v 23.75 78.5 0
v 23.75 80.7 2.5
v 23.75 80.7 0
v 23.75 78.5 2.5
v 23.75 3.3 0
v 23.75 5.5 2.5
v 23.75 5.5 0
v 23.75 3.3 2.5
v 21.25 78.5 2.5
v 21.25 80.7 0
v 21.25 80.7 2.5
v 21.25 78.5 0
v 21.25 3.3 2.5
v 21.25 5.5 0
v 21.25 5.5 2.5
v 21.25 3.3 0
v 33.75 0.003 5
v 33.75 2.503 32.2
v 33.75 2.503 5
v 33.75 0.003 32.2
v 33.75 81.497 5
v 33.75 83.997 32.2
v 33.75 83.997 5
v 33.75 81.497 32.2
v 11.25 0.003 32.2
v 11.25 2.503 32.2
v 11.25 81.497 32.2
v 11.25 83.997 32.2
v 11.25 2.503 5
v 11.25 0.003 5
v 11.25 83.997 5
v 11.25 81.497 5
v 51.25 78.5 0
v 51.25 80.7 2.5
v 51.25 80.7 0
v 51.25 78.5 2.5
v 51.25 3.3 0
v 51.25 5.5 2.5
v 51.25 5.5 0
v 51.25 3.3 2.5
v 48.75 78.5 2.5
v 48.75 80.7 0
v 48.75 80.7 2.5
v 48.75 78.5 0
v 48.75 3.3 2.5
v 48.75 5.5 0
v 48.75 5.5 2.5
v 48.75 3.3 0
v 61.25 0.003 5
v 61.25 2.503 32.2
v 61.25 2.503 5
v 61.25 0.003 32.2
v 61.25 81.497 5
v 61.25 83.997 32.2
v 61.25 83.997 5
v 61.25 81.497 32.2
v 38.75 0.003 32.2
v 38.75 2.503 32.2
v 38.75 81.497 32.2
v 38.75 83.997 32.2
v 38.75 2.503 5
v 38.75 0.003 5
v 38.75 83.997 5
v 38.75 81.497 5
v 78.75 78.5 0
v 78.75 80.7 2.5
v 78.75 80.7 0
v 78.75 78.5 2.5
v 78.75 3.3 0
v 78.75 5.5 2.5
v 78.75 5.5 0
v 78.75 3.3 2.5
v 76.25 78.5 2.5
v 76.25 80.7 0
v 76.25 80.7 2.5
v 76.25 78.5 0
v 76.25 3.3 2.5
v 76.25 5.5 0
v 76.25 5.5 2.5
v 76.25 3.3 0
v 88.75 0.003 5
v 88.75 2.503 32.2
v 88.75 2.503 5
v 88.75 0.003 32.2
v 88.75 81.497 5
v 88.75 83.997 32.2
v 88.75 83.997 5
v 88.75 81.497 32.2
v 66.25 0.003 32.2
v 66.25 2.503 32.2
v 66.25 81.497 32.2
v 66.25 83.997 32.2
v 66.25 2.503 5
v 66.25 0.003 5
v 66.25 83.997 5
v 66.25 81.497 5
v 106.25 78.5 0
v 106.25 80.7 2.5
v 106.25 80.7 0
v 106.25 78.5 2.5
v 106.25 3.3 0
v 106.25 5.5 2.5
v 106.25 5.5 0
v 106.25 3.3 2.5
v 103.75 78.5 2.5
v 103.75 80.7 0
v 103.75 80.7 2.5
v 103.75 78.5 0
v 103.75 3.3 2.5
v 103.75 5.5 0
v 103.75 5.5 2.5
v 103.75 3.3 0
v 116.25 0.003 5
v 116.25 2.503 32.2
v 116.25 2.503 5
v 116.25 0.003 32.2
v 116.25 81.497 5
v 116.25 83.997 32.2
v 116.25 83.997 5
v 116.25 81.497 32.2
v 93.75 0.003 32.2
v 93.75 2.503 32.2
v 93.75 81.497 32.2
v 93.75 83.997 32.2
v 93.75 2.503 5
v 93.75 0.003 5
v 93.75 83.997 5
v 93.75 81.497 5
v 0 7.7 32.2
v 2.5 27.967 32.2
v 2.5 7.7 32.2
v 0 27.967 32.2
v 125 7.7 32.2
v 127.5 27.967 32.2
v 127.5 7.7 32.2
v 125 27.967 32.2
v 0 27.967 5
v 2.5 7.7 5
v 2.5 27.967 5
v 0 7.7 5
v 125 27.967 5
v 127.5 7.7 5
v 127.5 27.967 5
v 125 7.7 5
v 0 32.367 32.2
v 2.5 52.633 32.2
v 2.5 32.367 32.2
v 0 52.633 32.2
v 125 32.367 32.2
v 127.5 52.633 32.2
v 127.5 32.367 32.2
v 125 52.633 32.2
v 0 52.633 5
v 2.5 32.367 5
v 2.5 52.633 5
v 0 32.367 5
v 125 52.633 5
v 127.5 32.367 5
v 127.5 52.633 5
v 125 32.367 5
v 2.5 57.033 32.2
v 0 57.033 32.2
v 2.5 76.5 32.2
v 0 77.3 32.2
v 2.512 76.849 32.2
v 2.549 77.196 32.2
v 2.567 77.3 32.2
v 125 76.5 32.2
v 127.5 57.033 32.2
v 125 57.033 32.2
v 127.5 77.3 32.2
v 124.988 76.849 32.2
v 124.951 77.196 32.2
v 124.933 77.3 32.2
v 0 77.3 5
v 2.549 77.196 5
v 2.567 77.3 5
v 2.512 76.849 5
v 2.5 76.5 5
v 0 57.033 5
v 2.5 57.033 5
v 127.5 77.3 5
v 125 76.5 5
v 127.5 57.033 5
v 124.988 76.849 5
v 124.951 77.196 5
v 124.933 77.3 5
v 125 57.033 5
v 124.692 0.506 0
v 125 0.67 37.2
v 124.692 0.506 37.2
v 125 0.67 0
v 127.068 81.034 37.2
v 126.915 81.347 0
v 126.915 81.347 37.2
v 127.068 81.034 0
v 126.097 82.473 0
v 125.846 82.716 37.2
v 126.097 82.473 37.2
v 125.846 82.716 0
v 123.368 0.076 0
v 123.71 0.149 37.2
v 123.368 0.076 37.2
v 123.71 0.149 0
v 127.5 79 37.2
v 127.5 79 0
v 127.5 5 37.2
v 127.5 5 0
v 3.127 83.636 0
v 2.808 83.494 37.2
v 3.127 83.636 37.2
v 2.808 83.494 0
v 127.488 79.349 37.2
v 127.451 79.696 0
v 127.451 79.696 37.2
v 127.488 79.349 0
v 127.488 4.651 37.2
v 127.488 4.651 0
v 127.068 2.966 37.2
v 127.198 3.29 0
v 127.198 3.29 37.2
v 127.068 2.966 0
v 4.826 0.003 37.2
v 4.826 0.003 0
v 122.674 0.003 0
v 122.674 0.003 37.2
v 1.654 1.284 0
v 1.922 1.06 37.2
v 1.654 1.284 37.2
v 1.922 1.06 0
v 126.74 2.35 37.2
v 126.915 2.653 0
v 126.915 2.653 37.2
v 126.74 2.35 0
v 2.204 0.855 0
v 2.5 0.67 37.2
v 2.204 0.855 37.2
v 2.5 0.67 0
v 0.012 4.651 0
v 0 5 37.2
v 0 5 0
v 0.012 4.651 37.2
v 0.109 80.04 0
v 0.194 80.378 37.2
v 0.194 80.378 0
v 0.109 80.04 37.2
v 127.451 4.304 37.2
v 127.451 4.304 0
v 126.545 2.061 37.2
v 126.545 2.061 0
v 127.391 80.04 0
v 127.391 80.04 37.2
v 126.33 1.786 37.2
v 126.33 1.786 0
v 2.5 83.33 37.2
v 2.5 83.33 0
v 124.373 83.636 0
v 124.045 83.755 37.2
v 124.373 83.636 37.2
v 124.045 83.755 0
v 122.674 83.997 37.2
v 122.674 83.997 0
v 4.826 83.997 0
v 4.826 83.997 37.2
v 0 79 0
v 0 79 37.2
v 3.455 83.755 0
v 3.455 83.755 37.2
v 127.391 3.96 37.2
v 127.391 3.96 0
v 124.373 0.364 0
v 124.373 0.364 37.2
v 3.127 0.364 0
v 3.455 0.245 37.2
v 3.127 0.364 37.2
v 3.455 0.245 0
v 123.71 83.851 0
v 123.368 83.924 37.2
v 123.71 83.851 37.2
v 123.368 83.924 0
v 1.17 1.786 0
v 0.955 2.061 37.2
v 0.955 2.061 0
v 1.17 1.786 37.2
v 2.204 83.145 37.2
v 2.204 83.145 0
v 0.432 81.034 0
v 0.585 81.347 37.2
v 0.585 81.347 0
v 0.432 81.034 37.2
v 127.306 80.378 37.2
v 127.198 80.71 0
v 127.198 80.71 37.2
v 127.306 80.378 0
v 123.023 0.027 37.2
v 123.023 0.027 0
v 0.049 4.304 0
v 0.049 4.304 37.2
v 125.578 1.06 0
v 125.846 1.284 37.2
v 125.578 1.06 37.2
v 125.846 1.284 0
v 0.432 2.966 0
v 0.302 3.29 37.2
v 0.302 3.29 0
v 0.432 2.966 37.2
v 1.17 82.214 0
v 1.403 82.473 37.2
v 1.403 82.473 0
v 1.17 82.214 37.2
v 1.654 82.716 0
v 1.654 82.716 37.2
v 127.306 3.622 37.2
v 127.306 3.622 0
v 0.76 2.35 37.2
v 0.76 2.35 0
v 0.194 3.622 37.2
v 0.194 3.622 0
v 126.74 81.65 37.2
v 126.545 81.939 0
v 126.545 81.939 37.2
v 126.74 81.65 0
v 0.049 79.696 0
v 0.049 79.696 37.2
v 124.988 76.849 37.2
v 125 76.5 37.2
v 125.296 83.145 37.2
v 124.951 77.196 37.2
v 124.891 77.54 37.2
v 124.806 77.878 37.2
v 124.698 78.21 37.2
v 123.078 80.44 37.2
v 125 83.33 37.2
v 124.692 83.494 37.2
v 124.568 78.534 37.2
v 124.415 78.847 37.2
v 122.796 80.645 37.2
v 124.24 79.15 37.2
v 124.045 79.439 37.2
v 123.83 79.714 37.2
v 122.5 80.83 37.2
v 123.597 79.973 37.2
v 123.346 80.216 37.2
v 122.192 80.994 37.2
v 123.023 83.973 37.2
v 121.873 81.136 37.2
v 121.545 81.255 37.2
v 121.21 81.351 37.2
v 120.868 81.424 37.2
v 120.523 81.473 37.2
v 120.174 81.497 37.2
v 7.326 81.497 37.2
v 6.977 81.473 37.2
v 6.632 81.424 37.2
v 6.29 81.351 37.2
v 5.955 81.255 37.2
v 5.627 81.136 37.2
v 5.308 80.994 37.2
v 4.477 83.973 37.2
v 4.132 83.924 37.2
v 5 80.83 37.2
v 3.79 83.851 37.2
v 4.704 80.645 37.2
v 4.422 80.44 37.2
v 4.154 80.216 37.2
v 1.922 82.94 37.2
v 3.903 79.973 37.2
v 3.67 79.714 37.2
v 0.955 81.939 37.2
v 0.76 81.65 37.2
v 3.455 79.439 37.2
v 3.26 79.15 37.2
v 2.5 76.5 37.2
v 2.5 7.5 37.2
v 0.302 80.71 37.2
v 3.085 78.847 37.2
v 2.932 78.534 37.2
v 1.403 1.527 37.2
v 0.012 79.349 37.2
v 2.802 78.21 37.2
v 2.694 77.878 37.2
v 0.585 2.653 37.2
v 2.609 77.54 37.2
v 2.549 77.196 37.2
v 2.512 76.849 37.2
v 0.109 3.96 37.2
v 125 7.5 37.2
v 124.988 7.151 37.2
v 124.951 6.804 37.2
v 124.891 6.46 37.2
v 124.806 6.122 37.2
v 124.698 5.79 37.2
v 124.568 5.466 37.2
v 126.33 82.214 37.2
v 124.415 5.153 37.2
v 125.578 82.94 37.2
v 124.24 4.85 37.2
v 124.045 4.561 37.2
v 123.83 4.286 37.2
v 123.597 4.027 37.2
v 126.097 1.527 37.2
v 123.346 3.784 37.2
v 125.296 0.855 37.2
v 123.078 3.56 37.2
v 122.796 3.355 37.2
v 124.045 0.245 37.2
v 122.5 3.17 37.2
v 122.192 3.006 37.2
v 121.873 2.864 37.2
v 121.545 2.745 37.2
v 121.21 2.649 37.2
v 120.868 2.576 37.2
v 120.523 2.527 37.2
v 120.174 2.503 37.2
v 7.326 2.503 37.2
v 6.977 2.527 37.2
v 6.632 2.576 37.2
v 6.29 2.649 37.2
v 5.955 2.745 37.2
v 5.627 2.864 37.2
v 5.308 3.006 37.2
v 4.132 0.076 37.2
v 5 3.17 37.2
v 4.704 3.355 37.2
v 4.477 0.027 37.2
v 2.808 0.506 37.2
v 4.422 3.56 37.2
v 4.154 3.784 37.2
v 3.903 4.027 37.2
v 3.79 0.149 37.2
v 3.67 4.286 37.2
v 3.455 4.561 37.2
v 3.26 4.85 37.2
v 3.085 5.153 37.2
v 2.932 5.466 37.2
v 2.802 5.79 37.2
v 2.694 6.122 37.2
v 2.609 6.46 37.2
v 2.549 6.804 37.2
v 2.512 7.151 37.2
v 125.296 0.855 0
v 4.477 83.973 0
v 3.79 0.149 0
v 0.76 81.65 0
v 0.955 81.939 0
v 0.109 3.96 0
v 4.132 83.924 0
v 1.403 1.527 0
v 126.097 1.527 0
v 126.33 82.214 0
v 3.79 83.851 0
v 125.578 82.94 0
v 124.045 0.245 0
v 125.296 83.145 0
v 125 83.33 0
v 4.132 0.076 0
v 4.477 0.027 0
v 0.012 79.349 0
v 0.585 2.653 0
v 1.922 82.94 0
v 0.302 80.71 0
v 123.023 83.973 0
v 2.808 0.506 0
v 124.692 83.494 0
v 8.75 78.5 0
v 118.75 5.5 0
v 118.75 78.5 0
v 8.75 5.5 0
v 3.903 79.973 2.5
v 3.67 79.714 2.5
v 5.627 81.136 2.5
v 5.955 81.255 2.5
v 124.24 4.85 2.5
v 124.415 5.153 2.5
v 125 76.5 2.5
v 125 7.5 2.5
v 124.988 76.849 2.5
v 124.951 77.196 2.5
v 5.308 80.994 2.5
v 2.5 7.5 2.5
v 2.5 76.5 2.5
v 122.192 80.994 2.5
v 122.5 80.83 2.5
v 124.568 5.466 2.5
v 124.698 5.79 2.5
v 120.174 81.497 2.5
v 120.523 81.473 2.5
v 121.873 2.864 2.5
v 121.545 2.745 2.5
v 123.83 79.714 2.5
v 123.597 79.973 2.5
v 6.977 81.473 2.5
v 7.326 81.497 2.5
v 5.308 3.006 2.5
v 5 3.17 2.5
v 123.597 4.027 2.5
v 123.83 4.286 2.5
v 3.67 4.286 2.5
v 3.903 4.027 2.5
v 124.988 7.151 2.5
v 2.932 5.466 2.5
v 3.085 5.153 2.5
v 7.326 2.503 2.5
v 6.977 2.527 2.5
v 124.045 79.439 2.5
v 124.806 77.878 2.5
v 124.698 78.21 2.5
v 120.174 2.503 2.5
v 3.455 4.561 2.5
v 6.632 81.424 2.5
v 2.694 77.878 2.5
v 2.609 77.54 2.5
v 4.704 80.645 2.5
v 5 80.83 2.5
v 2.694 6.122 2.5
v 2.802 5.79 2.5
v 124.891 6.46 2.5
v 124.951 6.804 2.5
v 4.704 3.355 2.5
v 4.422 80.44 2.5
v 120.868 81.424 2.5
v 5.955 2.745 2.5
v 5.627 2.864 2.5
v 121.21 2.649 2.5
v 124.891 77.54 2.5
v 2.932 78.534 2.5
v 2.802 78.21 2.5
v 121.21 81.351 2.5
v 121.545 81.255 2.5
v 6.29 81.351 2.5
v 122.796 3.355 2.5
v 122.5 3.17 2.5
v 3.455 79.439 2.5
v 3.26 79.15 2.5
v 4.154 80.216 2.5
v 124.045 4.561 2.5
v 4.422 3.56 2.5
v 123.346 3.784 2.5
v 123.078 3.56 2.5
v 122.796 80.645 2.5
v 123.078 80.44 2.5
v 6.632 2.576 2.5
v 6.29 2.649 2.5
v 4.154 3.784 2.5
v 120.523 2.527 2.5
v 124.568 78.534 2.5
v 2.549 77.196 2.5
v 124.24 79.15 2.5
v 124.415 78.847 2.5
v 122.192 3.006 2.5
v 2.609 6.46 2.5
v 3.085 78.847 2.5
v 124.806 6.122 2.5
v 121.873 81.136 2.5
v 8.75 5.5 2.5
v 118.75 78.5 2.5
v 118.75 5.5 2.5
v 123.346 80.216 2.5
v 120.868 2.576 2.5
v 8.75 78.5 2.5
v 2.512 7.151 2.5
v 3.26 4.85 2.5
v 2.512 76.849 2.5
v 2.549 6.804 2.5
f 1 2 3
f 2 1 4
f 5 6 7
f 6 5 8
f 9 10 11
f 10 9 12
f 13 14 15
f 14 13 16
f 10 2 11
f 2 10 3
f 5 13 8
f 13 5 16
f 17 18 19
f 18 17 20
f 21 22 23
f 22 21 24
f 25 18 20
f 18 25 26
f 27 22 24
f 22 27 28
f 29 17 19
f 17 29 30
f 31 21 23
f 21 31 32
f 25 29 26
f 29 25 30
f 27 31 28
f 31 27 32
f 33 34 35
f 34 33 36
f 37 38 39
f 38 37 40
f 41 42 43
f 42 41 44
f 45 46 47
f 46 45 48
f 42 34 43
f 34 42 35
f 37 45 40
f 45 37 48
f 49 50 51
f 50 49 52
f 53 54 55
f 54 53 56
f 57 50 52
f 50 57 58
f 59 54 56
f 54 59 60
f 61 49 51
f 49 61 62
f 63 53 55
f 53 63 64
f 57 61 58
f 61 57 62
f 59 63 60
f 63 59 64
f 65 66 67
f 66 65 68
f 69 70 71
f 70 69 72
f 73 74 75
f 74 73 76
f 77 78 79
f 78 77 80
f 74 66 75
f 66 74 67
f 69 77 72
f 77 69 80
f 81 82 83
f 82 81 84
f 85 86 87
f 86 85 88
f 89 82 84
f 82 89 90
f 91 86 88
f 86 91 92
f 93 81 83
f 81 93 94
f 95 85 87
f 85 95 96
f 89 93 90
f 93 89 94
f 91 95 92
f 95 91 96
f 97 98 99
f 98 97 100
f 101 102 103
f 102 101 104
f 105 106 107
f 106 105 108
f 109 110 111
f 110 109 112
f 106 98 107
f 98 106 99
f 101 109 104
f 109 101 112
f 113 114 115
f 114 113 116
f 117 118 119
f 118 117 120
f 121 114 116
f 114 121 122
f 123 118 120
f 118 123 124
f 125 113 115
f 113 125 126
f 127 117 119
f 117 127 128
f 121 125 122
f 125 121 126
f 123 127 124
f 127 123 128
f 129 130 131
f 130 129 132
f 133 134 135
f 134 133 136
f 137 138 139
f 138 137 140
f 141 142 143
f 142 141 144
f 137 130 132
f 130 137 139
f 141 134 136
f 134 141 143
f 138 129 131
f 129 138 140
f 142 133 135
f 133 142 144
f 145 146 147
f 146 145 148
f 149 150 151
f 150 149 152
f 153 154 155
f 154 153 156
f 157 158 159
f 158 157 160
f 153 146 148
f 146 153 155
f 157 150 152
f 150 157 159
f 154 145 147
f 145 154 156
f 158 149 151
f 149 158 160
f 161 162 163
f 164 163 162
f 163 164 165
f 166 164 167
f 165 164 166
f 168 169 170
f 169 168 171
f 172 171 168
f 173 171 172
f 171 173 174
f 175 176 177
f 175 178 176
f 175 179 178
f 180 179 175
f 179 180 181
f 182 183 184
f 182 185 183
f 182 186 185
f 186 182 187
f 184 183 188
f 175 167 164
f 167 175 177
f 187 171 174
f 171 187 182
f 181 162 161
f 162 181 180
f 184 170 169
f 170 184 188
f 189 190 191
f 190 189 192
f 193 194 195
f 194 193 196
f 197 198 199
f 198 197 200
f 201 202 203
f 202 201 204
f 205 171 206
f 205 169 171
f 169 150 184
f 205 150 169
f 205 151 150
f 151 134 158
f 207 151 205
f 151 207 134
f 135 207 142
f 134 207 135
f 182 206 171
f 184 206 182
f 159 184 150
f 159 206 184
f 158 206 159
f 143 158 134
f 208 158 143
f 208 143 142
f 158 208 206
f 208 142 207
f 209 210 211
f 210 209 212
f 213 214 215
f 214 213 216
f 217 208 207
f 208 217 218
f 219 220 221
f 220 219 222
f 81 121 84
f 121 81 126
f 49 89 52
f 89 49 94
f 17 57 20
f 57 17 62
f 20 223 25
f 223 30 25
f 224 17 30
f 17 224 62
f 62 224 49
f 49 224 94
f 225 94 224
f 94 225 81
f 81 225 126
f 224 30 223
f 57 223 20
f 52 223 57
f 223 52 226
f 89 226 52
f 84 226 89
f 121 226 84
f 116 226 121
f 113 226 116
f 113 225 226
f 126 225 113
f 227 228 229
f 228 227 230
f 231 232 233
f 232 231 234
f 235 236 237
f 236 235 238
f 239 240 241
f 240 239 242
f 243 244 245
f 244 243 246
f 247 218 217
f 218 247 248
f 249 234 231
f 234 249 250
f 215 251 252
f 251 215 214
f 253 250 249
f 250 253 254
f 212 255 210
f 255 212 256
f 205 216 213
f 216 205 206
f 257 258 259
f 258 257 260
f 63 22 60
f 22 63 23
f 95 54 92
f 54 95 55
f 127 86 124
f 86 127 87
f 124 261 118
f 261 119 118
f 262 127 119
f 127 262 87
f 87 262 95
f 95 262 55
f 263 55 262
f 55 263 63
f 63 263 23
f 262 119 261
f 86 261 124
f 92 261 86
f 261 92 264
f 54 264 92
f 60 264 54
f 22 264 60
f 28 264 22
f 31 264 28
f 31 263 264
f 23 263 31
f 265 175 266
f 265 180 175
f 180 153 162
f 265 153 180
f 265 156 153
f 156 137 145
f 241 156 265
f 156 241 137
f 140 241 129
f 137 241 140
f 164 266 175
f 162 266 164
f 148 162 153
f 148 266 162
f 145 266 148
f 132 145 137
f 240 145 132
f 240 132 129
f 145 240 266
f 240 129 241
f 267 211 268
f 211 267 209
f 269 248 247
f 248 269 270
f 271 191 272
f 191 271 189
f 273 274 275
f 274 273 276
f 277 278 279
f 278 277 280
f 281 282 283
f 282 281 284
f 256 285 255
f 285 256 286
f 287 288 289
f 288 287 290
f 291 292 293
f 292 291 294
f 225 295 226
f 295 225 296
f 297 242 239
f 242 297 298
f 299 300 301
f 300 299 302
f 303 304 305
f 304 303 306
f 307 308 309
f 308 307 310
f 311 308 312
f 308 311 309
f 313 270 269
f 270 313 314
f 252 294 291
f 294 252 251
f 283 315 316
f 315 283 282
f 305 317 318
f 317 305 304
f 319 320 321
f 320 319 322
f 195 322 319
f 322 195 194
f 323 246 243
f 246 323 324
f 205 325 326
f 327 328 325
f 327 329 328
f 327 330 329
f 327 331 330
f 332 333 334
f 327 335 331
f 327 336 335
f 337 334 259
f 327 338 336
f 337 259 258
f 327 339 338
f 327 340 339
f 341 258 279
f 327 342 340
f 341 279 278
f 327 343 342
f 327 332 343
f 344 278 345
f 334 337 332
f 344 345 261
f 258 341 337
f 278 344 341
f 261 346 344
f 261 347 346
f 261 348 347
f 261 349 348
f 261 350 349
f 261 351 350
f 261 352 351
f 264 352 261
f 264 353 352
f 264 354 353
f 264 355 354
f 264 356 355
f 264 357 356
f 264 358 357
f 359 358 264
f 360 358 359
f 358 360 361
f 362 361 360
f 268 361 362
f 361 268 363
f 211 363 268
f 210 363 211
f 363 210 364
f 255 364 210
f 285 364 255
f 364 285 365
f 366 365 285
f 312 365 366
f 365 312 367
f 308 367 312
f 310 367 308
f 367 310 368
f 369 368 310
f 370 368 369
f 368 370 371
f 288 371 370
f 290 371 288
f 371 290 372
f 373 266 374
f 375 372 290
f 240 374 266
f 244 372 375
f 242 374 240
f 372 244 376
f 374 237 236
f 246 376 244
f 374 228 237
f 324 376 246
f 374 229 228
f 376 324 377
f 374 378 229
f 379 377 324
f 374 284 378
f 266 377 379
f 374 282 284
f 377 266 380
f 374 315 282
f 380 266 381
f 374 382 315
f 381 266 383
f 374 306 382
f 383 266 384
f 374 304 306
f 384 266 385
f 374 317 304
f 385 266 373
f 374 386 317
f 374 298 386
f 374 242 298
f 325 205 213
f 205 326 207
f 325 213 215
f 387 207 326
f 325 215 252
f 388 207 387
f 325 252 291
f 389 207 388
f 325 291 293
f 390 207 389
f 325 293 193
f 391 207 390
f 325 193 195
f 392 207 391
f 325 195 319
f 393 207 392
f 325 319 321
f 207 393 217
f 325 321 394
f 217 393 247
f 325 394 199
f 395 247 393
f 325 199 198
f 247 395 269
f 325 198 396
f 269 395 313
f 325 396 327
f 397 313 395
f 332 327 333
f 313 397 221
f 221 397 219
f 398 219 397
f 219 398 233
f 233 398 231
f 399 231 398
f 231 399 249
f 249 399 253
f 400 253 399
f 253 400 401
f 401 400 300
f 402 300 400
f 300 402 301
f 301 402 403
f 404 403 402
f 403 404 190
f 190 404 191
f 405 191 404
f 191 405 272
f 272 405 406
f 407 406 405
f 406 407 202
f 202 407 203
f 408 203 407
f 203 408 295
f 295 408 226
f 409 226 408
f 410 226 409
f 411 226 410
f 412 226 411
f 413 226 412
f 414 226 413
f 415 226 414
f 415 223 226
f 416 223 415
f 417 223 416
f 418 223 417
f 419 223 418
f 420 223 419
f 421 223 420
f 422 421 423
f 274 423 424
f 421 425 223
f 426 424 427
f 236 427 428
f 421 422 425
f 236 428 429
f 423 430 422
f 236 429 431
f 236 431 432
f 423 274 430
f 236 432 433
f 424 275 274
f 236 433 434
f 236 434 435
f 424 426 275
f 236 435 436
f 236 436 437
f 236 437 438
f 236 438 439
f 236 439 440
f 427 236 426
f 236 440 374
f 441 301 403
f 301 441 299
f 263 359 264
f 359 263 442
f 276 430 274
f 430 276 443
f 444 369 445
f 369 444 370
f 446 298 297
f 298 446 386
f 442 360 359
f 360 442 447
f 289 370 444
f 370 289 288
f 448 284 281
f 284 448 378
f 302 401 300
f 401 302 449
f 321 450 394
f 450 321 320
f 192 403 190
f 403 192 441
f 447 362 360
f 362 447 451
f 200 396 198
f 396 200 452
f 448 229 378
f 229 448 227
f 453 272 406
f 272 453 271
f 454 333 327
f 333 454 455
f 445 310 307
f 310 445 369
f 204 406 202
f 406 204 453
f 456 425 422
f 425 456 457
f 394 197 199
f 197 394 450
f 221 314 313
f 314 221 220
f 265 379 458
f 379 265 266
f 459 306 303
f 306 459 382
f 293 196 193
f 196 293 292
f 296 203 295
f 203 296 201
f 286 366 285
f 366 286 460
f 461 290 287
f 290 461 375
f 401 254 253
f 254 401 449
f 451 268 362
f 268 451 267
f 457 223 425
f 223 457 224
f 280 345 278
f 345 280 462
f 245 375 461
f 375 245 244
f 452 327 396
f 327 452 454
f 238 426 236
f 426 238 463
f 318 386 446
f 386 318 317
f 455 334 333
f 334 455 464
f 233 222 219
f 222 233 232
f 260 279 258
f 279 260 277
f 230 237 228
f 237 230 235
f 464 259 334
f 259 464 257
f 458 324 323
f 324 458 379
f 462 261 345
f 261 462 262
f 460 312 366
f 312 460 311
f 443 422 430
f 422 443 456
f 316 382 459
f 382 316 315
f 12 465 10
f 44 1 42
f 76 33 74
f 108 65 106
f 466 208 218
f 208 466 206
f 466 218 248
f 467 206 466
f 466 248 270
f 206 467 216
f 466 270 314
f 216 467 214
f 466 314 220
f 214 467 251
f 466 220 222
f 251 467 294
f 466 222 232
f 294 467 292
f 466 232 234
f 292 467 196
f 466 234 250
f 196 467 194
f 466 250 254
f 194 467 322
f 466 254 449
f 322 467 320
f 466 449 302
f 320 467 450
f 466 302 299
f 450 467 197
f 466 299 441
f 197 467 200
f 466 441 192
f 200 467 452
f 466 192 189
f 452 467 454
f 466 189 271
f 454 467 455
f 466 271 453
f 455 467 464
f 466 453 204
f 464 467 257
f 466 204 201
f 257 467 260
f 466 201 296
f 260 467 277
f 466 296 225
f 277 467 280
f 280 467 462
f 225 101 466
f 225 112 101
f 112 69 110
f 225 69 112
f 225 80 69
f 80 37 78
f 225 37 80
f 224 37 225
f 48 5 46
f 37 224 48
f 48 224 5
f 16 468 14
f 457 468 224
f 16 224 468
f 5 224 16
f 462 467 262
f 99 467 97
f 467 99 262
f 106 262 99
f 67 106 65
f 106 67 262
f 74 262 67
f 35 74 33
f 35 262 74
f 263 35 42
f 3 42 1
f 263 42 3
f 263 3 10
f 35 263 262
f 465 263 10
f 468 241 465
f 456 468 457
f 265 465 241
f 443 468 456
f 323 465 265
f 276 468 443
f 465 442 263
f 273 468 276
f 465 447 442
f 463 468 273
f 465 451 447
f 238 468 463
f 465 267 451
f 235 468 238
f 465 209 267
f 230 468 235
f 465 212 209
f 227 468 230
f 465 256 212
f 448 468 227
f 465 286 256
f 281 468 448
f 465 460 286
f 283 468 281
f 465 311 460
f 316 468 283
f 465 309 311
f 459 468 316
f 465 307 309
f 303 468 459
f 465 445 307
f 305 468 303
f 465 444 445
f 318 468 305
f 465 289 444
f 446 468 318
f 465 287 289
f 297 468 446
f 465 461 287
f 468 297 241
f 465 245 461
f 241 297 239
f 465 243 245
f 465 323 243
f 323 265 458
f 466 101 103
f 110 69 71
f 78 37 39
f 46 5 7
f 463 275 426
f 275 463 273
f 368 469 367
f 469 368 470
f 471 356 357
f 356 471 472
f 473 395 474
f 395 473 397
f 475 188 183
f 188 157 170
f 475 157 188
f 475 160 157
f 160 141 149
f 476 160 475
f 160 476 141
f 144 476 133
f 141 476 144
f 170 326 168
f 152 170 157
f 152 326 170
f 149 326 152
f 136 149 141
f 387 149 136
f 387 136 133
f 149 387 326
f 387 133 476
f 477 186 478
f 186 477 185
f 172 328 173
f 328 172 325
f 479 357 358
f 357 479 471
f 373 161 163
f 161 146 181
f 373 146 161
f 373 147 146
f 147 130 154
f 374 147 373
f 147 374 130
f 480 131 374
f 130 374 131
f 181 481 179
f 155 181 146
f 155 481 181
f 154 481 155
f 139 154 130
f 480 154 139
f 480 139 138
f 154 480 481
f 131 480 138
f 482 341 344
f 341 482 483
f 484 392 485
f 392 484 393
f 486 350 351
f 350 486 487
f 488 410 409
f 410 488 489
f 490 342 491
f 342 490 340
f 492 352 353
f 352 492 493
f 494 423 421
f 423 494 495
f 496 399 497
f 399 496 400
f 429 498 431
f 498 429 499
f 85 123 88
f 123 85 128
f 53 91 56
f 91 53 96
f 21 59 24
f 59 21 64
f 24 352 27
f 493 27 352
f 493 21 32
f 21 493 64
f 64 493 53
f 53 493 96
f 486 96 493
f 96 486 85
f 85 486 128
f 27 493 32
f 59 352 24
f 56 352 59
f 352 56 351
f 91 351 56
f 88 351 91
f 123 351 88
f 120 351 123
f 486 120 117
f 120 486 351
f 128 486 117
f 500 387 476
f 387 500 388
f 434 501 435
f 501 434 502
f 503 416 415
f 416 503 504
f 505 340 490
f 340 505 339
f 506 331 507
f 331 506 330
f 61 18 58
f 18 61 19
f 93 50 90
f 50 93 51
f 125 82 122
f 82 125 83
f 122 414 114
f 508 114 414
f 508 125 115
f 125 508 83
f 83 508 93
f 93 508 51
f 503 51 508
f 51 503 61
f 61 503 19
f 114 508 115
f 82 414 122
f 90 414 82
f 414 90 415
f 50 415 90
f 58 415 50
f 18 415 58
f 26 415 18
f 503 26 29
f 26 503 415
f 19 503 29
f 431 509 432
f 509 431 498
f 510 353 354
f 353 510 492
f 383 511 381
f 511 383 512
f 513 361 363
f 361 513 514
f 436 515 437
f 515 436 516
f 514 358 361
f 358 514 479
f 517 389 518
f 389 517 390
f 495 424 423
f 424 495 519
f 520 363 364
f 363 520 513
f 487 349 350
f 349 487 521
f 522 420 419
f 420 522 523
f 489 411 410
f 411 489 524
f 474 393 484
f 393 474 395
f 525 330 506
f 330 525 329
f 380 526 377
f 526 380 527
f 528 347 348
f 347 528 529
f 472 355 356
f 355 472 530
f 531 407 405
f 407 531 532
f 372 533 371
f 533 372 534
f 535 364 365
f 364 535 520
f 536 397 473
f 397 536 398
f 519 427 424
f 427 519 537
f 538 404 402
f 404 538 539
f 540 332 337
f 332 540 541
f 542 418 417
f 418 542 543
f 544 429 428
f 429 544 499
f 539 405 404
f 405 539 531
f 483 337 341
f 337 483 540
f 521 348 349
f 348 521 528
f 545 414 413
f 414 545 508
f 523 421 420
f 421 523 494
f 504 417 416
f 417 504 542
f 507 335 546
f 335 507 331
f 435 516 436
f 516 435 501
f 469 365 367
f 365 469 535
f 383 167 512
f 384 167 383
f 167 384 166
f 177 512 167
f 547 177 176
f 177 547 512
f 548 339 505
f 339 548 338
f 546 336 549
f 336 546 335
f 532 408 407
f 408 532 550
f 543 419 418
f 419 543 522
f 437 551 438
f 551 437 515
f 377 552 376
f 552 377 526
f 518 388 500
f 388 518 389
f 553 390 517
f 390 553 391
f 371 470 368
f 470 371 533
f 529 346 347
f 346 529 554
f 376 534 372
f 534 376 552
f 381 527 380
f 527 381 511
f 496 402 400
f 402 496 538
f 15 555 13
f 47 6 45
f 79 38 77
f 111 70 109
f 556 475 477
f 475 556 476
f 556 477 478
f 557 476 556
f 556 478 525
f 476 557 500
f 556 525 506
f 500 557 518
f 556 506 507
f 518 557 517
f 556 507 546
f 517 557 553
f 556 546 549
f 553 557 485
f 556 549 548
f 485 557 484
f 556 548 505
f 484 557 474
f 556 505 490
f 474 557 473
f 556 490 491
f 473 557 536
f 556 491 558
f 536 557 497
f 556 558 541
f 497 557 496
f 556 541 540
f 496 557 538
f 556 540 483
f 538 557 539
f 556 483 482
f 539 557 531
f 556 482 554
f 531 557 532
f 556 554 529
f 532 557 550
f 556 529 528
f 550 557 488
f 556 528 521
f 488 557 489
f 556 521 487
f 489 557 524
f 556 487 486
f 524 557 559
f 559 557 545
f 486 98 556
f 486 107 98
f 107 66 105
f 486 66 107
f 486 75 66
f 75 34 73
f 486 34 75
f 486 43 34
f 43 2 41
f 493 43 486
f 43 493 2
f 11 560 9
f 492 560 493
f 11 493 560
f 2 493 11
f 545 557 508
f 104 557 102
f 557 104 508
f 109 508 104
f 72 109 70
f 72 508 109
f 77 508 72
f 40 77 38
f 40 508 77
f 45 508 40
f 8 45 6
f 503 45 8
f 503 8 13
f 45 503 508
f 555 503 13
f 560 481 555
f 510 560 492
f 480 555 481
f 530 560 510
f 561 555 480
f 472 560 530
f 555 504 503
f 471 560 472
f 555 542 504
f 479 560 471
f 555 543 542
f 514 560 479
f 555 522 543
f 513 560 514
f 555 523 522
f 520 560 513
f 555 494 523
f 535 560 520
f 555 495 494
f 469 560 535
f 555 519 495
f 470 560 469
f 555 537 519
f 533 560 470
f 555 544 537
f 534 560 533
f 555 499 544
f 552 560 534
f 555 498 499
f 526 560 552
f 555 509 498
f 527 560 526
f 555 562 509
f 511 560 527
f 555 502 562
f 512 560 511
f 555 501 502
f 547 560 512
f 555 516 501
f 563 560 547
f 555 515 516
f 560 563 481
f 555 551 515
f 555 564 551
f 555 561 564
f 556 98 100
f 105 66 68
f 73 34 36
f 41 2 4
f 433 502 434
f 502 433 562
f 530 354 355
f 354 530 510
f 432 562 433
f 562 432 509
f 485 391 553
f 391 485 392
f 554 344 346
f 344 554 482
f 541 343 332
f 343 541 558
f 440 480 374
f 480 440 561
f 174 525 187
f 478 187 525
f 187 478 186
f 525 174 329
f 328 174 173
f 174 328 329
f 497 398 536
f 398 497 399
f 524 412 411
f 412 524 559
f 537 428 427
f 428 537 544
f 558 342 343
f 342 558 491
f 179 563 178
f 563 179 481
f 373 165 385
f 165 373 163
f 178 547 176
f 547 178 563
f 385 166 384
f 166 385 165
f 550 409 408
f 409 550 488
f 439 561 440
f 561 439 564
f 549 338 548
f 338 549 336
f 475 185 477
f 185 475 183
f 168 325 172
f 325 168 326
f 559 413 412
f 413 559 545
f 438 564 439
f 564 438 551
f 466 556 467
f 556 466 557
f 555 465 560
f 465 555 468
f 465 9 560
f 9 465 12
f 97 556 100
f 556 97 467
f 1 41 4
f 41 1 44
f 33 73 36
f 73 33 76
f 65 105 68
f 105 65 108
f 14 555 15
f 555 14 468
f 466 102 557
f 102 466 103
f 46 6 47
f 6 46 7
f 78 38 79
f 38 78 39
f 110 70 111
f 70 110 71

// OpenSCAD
// file: round_corners.scad
module round_cube (x=40,y=30,z=2,d=10)
{
    A = x-d;
    B = y-d;
    C = z;
    
    translate([d/2,d/2,0])
    hull()
    {
        cylinder(d=d, h=C);
        translate([A,0,0]) cylinder(d=d, h=C);
        translate([A,B,0]) cylinder(d=d, h=C);
        translate([0,B,0]) cylinder(d=d, h=C);
    }
    
    
}

round_cube();

$fn = 90;
module box (x=82,y=154,z=52,d=20,t=2)
{
    A = x-d;
    B = y-d;
    C = z;
    
    //%translate([-d/2,-d/2,0]) cube([x,y,z]);
    difference()
    {
        hull()
        {
            cylinder(d=d, h=C);
            translate([A,0,0]) cylinder(d=d, h=C);
            translate([A,B,0]) cylinder(d=d, h=C);
            translate([0,B,0]) cylinder(d=d, h=C);
        }
        
        translate([-t/2,-t/2,t])
        hull()
        {
            translate([t,t,0]) cylinder(d=d-t, h=C);
            translate([A,t,0]) cylinder(d=d-t, h=C);
            translate([A,B,0]) cylinder(d=d-t, h=C);
            translate([t,B,0]) cylinder(d=d-t, h=C);
        }
    }
}

//box();
// main file
use<round_corners.scad>;

eps = 0.01;

// main parameters
// holder outer dimensions
h_x = 127.5;
h_y = 84;
h_z = 37.2;
h_d = 10;

// wall thickness
wt = 2.5;

// bath hole parameters
bh_x = 110;
bh_y = 73;
// bath hole peaks parameters
bhp_x = 2.5;
bhp_y = 2.2;
bhp_off = 25;

module bath_holder()
{
    difference()
    {
        // basic shape
        //cube([h_x, h_y, h_z]);
        round_cube(x=h_x,y=h_y,z=h_z,d=h_d);
        
        // main inner hole
        translate([wt,wt,wt])
            //cube([h_x-2*wt, h_y-2*wt, h_z-wt+eps]);
            round_cube(x=h_x-2*wt,y=h_y-2*wt,z=h_z-wt+eps,d=10);
        // main holes for baths
        mhx_o = (h_x-bh_x)/2;
        mhy_o = (h_y-bh_y)/2;
        translate([mhx_o,mhy_o,-eps]) cube([bh_x, bh_y, wt+2*eps]);
        // peak holes
        for(i=[0:3])
        {
            xi_o = mhx_o+bhp_off/2 + i*(bhp_off+bhp_x);
            yi_o = mhy_o-bhp_y;
            zi_o = -eps;
            xi = bhp_x;
            yi = bh_y + 2*bhp_y; 
            zi = wt + 2*eps;
            translate([xi_o, yi_o, zi_o]) cube([xi, yi, zi]);
            
            xh_i = mhx_o + bhp_x + i*(bhp_off+bhp_x);
            translate([xh_i,-eps,2*wt])
                cube([bhp_off-bhp_x,h_y+2*eps,h_z-4*wt]);
        }
        
        for(i=[0:2])
        {           
            yh = (h_y - h_d - 6* bhp_y)/3;
            yh_o = mhy_o + bhp_y + i*(yh+2*bhp_y);
            translate([-eps,yh_o,2*wt])
                cube([h_x+2*eps,yh,,h_z-4*wt]);
        }
    }
}

bath_holder();
